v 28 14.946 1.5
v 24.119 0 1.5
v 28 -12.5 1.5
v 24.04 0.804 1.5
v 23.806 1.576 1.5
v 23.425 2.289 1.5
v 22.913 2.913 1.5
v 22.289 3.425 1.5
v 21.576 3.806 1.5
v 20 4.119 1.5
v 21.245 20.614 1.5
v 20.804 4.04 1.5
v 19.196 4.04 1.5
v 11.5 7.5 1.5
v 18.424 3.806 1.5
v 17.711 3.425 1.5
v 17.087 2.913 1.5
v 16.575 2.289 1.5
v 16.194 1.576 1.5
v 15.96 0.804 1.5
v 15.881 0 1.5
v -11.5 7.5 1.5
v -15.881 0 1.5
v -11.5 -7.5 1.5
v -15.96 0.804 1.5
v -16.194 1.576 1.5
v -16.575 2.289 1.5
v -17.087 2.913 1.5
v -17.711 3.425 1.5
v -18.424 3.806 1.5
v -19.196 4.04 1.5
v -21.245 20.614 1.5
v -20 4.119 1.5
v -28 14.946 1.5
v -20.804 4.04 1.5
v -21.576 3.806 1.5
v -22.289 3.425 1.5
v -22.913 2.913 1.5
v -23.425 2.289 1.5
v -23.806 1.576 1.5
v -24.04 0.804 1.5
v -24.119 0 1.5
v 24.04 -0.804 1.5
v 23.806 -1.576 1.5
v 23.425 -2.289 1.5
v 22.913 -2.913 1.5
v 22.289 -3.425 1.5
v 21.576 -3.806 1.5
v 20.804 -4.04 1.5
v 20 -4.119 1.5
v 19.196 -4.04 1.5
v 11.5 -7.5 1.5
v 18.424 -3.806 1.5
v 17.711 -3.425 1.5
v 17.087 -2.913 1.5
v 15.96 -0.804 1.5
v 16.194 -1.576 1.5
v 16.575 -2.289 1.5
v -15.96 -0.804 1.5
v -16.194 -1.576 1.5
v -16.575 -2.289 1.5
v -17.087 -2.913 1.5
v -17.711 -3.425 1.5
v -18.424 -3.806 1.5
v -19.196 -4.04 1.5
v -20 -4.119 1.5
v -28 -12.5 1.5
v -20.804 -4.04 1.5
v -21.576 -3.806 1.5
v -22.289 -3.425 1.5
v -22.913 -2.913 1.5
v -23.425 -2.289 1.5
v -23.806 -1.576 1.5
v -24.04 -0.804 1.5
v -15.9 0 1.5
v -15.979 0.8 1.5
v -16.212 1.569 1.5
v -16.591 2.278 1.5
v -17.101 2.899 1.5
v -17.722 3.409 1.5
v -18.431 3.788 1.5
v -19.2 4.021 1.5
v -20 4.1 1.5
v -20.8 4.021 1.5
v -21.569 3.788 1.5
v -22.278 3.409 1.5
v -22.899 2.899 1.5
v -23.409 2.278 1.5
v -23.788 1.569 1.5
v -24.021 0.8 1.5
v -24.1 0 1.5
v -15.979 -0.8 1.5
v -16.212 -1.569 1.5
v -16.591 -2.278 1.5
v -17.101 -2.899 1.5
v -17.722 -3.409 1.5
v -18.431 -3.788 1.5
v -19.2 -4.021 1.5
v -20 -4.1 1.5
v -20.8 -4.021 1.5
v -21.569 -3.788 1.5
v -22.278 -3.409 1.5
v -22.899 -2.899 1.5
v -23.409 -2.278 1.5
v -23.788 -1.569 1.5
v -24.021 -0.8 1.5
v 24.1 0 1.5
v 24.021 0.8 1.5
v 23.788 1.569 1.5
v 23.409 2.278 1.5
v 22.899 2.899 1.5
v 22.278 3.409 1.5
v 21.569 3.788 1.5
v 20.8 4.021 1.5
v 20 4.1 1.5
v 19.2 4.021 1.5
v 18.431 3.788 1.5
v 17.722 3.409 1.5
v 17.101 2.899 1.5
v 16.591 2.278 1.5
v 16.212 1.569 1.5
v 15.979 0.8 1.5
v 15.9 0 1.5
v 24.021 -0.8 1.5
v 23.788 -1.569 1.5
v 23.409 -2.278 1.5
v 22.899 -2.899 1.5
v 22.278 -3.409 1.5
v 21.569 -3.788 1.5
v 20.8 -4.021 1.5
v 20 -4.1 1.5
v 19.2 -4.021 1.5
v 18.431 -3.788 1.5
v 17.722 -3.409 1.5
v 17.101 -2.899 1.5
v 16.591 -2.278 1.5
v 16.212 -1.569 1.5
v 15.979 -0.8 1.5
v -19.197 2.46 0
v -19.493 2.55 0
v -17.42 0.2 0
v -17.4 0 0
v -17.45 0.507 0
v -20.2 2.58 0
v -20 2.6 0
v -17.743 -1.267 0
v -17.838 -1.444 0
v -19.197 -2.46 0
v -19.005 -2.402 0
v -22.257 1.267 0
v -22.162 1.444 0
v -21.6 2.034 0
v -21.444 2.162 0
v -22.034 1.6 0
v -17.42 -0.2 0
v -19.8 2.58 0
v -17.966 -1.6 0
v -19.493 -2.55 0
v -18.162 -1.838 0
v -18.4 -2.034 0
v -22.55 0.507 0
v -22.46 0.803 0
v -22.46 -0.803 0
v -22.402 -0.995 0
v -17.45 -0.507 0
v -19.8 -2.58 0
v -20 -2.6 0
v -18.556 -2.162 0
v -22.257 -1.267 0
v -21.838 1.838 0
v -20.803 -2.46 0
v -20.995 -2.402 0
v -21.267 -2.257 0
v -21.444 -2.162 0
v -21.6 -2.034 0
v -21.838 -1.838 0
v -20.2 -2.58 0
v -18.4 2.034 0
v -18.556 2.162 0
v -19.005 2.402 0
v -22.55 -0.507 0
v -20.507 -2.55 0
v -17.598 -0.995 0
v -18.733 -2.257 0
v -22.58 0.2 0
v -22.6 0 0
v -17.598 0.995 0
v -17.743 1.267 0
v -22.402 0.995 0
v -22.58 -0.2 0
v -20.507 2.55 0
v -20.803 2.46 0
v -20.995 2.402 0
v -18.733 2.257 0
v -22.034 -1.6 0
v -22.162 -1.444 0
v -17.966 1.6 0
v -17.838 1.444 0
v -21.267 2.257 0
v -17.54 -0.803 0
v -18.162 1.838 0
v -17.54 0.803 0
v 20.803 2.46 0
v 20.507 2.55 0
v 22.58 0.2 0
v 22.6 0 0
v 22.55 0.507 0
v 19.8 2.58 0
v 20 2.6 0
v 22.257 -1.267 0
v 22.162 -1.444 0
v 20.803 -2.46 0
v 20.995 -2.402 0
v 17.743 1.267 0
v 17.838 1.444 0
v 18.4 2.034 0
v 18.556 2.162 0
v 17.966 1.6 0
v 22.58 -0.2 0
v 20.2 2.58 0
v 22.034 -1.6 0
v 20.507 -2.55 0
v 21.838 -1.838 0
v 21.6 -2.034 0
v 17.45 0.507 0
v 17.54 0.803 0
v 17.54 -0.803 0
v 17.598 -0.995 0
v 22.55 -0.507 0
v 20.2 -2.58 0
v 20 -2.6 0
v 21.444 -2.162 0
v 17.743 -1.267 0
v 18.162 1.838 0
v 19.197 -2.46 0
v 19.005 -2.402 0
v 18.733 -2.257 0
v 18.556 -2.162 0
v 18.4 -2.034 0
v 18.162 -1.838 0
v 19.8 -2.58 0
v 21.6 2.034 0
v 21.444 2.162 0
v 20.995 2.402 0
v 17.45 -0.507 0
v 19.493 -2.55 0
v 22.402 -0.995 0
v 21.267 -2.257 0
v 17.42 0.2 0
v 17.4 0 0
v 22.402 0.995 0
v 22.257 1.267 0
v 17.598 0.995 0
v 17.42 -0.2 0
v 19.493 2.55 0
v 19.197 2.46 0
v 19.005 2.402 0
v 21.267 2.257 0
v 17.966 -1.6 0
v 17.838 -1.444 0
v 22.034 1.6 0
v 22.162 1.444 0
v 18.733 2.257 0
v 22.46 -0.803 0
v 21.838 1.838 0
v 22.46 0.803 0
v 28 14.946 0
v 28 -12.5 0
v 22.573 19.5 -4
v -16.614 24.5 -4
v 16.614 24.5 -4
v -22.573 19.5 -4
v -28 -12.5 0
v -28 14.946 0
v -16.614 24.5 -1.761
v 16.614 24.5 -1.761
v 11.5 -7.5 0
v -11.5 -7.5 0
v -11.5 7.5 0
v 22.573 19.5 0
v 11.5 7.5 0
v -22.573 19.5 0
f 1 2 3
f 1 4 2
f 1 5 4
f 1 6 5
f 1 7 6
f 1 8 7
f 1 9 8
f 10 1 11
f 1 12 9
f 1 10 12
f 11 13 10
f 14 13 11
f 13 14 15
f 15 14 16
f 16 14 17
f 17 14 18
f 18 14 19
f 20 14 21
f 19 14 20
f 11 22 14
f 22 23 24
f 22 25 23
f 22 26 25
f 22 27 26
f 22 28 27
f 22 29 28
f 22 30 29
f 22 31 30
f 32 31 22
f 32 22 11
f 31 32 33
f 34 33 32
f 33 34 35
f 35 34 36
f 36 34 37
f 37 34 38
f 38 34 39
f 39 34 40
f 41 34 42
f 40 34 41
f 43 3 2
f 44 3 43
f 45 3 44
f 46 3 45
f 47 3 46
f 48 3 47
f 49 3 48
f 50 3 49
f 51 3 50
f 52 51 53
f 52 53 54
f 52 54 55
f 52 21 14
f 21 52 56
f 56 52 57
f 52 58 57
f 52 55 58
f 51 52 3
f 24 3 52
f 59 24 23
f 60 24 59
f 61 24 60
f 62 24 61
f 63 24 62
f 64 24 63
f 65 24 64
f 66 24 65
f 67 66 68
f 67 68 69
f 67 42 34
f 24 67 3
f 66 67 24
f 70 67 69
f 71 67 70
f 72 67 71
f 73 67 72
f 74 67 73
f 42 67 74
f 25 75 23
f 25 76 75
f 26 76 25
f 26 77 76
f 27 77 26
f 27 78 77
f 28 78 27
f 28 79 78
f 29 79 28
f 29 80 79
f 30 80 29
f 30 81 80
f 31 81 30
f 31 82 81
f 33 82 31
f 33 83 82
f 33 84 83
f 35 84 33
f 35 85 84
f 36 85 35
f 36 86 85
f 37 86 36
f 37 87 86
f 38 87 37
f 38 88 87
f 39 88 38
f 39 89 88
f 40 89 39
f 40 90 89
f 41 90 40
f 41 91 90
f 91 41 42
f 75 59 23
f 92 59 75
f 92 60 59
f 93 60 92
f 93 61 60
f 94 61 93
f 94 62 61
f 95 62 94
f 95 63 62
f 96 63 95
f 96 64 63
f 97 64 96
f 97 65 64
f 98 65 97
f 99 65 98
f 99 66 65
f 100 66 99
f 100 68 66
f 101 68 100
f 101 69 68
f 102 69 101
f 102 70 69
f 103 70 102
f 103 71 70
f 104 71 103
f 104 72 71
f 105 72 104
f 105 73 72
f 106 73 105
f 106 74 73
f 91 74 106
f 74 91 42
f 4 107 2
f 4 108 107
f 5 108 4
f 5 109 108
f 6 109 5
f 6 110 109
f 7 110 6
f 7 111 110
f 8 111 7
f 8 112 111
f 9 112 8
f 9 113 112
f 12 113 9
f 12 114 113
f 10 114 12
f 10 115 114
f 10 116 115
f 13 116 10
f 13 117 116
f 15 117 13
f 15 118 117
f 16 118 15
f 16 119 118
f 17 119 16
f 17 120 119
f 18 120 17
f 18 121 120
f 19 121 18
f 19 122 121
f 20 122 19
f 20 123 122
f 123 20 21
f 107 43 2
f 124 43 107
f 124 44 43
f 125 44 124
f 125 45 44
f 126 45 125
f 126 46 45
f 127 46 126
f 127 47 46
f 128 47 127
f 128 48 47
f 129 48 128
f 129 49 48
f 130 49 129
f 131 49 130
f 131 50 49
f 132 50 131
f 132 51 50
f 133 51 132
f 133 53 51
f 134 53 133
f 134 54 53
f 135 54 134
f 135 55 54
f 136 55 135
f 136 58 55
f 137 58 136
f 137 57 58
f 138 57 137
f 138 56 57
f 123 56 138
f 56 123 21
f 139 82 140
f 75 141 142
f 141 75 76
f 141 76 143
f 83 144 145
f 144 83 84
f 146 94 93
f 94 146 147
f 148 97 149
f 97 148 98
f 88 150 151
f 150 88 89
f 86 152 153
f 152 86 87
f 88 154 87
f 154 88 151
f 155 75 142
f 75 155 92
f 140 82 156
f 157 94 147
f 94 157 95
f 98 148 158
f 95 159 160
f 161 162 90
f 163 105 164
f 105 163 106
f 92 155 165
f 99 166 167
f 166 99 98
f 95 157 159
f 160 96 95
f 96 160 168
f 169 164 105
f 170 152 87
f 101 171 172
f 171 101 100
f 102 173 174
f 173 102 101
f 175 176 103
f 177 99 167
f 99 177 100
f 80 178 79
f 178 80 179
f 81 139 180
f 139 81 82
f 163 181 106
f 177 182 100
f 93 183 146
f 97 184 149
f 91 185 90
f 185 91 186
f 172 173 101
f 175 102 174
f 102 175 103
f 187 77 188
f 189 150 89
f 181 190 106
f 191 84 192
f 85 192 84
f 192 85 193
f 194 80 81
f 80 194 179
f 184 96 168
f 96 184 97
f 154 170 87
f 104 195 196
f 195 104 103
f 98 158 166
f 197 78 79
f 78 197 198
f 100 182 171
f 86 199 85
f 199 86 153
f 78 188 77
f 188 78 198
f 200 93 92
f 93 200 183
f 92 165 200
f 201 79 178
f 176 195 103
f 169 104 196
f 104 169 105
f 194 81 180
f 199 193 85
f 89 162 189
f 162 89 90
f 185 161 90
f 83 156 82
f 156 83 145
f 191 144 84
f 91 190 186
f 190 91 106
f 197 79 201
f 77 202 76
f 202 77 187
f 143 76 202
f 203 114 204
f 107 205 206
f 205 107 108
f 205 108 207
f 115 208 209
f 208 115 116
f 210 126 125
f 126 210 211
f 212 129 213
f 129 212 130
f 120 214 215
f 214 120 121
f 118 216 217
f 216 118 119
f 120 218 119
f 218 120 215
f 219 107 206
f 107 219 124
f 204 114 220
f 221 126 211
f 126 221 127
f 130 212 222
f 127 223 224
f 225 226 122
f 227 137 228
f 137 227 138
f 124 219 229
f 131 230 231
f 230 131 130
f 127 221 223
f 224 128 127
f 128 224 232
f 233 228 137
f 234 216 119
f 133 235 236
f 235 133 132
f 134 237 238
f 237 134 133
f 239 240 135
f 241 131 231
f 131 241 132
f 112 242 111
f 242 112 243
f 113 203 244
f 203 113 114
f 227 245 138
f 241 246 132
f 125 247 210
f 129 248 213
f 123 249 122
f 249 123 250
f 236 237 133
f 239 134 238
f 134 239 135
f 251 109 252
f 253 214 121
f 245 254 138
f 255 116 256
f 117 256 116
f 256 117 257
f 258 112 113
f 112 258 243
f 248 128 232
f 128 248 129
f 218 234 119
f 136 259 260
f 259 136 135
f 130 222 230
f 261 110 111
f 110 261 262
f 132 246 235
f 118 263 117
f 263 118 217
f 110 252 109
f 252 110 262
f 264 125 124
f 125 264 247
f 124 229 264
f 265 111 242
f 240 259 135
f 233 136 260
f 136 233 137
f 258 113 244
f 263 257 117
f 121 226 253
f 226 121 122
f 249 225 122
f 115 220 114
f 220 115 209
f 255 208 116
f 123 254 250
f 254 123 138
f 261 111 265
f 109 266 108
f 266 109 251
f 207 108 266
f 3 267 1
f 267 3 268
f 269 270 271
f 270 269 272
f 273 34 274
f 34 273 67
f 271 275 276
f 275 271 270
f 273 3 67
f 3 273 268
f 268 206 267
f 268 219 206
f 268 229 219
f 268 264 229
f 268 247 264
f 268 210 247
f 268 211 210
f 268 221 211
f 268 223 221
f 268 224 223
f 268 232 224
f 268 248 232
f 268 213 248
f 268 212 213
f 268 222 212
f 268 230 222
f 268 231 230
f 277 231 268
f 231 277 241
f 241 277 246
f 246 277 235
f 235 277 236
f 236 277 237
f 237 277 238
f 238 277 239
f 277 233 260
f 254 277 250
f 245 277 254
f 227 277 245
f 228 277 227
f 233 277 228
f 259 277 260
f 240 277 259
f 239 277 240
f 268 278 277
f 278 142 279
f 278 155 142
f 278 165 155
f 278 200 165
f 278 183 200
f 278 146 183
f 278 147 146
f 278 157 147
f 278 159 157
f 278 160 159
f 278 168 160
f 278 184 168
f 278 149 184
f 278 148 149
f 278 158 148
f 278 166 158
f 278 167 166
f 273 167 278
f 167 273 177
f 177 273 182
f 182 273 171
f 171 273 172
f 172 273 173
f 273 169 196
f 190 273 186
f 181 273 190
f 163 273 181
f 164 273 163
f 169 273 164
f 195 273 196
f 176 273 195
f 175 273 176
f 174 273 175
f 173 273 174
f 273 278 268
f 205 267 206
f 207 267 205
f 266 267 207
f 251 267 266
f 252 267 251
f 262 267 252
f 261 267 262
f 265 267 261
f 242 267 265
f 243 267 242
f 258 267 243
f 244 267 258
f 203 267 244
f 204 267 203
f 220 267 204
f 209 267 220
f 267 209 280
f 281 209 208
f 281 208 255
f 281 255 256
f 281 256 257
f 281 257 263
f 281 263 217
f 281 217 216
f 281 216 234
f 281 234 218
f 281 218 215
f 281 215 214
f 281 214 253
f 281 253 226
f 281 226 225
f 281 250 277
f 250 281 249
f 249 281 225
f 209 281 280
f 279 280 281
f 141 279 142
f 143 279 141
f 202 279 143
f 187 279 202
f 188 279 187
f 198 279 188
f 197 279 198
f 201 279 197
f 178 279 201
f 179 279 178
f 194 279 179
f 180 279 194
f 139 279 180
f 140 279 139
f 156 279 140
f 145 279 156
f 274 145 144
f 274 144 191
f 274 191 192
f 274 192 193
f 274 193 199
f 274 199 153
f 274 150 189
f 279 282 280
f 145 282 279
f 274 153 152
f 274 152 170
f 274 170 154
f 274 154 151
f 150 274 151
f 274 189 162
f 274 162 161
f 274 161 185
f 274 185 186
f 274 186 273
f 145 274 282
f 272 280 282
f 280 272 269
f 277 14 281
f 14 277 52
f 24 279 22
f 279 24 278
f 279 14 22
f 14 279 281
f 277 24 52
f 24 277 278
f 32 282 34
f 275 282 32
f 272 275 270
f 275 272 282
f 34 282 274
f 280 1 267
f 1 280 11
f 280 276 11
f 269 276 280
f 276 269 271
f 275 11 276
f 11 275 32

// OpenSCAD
// file: zcube.scad
// This function creates a cube with a given x/y either above (f=1) or below (f=-1) the z axis.
module zcube(dimensions, z=0, f=1) {
	translate([0, 0, dimensions[2]/2 * f + z]) cube(dimensions, true);
}

module zring(dimensions, thickness, z=0, f=1) {
	render() difference() {
		zcube([dimensions[0]+thickness/2, dimensions[1]+thickness/2, dimensions[2]], z=z, f=f);
		zcube([dimensions[0]-thickness/2, dimensions[1]-thickness/2, dimensions[2]], z=z, f=f);
	}
}

module rcube(dimensions, d = 1, z=0, f=1) {
	dx = dimensions[0]/2 - d/2;
	dy = dimensions[1]/2 - d/2;
	dz = dimensions[2]/2 * (f-1) + z;
	
	hull() {
		translate([-dx, -dy, dz]) cylinder(h=dimensions[2], d=d);
		translate([-dx, dy, dz]) cylinder(h=dimensions[2], d=d);
		translate([dx, -dy, dz]) cylinder(h=dimensions[2], d=d);
		translate([dx, dy, dz]) cylinder(h=dimensions[2], d=d);
	}
}

module zcorners() {
	children();
	mirror([1, 0, 0]) children();
	mirror([0, 1, 0]) children();
	mirror([1, 0, 0]) mirror([0, 1, 0]) children();
}

module reflect(axis = [1, 0, 0]) {
	children();
	mirror(axis) children();
}

module zsides(dimensions, thickness, inset=0) {
	reflect([1, 0, 0]) {
		translate([thickness/2+dimensions[0]/2, 0, dimensions[2]/2]) cube([thickness, dimensions[1]-inset*2, dimensions[2]], true);
	}
	
	reflect([0, 1, 0]) {
		translate([0, thickness/2+dimensions[1]/2, dimensions[2]/2]) cube([dimensions[0]-inset*2, thickness, dimensions[2]], true);
	}
}
// file: bolts.scad
$radial_error = 0.1;
$fn = 4*8;

module cylinder_outer(height, radius, fn=$fn, radial_error=$radial_error) {
	fudge = 1/cos(180/fn);
	cylinder(h=height,r=radius*fudge+$radial_error, $fn=fn);
}

module cylinder_inner(height, radius, fn=$fn) {
	cylinder(h=height,r=radius-$radial_error,$fn=fn);
}

// Make a hole. The diameter is the size of the screw (e.g. 3 for M3). Depth is how far the hole should go for the thread, and inset is how far out there should be a hole for the head to go.
module hole(diameter=3, depth=6, inset=10) {
	cylinder_outer(depth, diameter/2);
	translate([0, 0, depth]) cylinder_outer(inset, diameter, 32);
}

module countersunk_hole(diameter=3, depth=6, inset=10) {
	hole(diameter, depth, inset);
	translate([0, 0, depth-diameter/2]) cylinder(r1=diameter/2+$radial_error, r2=diameter+$radial_error, h=diameter/2);
}

module threaded_countersunk_hole(diameter=3, depth=6, inset=10) {
	hole(diameter*0.9, depth, inset);
	translate([0, 0, depth-diameter/2]) cylinder(r1=diameter/2+$radial_error, r2=diameter+$radial_error, h=diameter/2);
}

module knurled_insert(diameter = 3, depth = 6, thickness = 1) {
	cylinder_inner(depth, diameter/2 + thickness);
}

module knurled_hole(diameter = 3, depth = 6, inset = 10, insert = 4, thickness = 1) {
	hole(diameter, depth, inset);
	
	knurled_insert(diameter, insert, thickness);
}

module countersunk_knurled_hole(diameter = 3, depth = 6, inset = 10, insert = 4, thickness = 1) {
	countersunk_hole(diameter, depth, inset);
	
	knurled_insert(diameter, insert, thickness);
}

// Make a hole for a bolt/screw combination.
module bolted_hole(diameter=3, depth=8, nut_offset=2, shaft_length=10, inset=10) {
	hole(diameter, depth, inset);
	hull() {
		shaft_width = diameter;
		translate([0, 0, nut_offset]) rotate(360/12, [0, 0, 1]) cylinder_outer(diameter, shaft_width, 6);
		translate([0, shaft_length, nut_offset]) rotate(360/12, [0, 0, 1]) cylinder_outer(diameter, shaft_width, 6);
	}
}

module countersunk_bolted_hole(diameter=3, depth=8, nut_offset=2, shaft_length=10, inset=10) {
	countersunk_hole(diameter, depth, inset);
	hull() {
		shaft_width = diameter;
		translate([0, 0, nut_offset]) rotate(360/12, [0, 0, 1]) cylinder_outer(diameter, shaft_width, 6);
		translate([0, shaft_length, nut_offset]) rotate(360/12, [0, 0, 1]) cylinder_outer(diameter, shaft_width, 6);
	}
}

module mounting_hole(diameter=3, depth=6, inset=10, outset=3) {
	difference() {
		cylinder_outer(depth, diameter/2+outset);
		hole(diameter=diameter, depth=depth, inset=inset);
	}
}

render() rotate(90, [1, 0, 0]) difference() {
	cube([40, 10, 10]);
	translate([5, 5, 0]) bolted_hole(diameter=3, depth=8);
	translate([15, 5, 0]) bolted_hole(diameter=4, depth=8);
	translate([25, 5, 0]) countersunk_hole(diameter=4, depth=8);
	translate([35, 5, 0]) knurled_hole();
}
// main file
use <bolts.scad>;
use <zcube.scad>;

outset = 4;

render() difference() {
	offset = (32-15)/2-5;
	
	translate([0, offset+5/2, -outset]) zcube([56, 32+5, 1.5+outset]);
	translate([0, offset, -10]) zcube([56, 32, 10]);
	
	zcube([23, 15, 1.5]);
	
	translate([-20, 0, 0]) countersunk_hole(4, 1.5);
	translate([20, 0, 0]) countersunk_hole(4, 1.5);
	
	translate([-56/2, 28, -10]) rotate([0, 0, 45-5]) zcube([20, 20, 20]);
	translate([56/2, 28, -10]) rotate([0, 0, 45+5]) zcube([20, 20, 20]);
	translate([0, 32, 5]) rotate([50, 0, 0]) zcube([56, 20, 20]);
}
